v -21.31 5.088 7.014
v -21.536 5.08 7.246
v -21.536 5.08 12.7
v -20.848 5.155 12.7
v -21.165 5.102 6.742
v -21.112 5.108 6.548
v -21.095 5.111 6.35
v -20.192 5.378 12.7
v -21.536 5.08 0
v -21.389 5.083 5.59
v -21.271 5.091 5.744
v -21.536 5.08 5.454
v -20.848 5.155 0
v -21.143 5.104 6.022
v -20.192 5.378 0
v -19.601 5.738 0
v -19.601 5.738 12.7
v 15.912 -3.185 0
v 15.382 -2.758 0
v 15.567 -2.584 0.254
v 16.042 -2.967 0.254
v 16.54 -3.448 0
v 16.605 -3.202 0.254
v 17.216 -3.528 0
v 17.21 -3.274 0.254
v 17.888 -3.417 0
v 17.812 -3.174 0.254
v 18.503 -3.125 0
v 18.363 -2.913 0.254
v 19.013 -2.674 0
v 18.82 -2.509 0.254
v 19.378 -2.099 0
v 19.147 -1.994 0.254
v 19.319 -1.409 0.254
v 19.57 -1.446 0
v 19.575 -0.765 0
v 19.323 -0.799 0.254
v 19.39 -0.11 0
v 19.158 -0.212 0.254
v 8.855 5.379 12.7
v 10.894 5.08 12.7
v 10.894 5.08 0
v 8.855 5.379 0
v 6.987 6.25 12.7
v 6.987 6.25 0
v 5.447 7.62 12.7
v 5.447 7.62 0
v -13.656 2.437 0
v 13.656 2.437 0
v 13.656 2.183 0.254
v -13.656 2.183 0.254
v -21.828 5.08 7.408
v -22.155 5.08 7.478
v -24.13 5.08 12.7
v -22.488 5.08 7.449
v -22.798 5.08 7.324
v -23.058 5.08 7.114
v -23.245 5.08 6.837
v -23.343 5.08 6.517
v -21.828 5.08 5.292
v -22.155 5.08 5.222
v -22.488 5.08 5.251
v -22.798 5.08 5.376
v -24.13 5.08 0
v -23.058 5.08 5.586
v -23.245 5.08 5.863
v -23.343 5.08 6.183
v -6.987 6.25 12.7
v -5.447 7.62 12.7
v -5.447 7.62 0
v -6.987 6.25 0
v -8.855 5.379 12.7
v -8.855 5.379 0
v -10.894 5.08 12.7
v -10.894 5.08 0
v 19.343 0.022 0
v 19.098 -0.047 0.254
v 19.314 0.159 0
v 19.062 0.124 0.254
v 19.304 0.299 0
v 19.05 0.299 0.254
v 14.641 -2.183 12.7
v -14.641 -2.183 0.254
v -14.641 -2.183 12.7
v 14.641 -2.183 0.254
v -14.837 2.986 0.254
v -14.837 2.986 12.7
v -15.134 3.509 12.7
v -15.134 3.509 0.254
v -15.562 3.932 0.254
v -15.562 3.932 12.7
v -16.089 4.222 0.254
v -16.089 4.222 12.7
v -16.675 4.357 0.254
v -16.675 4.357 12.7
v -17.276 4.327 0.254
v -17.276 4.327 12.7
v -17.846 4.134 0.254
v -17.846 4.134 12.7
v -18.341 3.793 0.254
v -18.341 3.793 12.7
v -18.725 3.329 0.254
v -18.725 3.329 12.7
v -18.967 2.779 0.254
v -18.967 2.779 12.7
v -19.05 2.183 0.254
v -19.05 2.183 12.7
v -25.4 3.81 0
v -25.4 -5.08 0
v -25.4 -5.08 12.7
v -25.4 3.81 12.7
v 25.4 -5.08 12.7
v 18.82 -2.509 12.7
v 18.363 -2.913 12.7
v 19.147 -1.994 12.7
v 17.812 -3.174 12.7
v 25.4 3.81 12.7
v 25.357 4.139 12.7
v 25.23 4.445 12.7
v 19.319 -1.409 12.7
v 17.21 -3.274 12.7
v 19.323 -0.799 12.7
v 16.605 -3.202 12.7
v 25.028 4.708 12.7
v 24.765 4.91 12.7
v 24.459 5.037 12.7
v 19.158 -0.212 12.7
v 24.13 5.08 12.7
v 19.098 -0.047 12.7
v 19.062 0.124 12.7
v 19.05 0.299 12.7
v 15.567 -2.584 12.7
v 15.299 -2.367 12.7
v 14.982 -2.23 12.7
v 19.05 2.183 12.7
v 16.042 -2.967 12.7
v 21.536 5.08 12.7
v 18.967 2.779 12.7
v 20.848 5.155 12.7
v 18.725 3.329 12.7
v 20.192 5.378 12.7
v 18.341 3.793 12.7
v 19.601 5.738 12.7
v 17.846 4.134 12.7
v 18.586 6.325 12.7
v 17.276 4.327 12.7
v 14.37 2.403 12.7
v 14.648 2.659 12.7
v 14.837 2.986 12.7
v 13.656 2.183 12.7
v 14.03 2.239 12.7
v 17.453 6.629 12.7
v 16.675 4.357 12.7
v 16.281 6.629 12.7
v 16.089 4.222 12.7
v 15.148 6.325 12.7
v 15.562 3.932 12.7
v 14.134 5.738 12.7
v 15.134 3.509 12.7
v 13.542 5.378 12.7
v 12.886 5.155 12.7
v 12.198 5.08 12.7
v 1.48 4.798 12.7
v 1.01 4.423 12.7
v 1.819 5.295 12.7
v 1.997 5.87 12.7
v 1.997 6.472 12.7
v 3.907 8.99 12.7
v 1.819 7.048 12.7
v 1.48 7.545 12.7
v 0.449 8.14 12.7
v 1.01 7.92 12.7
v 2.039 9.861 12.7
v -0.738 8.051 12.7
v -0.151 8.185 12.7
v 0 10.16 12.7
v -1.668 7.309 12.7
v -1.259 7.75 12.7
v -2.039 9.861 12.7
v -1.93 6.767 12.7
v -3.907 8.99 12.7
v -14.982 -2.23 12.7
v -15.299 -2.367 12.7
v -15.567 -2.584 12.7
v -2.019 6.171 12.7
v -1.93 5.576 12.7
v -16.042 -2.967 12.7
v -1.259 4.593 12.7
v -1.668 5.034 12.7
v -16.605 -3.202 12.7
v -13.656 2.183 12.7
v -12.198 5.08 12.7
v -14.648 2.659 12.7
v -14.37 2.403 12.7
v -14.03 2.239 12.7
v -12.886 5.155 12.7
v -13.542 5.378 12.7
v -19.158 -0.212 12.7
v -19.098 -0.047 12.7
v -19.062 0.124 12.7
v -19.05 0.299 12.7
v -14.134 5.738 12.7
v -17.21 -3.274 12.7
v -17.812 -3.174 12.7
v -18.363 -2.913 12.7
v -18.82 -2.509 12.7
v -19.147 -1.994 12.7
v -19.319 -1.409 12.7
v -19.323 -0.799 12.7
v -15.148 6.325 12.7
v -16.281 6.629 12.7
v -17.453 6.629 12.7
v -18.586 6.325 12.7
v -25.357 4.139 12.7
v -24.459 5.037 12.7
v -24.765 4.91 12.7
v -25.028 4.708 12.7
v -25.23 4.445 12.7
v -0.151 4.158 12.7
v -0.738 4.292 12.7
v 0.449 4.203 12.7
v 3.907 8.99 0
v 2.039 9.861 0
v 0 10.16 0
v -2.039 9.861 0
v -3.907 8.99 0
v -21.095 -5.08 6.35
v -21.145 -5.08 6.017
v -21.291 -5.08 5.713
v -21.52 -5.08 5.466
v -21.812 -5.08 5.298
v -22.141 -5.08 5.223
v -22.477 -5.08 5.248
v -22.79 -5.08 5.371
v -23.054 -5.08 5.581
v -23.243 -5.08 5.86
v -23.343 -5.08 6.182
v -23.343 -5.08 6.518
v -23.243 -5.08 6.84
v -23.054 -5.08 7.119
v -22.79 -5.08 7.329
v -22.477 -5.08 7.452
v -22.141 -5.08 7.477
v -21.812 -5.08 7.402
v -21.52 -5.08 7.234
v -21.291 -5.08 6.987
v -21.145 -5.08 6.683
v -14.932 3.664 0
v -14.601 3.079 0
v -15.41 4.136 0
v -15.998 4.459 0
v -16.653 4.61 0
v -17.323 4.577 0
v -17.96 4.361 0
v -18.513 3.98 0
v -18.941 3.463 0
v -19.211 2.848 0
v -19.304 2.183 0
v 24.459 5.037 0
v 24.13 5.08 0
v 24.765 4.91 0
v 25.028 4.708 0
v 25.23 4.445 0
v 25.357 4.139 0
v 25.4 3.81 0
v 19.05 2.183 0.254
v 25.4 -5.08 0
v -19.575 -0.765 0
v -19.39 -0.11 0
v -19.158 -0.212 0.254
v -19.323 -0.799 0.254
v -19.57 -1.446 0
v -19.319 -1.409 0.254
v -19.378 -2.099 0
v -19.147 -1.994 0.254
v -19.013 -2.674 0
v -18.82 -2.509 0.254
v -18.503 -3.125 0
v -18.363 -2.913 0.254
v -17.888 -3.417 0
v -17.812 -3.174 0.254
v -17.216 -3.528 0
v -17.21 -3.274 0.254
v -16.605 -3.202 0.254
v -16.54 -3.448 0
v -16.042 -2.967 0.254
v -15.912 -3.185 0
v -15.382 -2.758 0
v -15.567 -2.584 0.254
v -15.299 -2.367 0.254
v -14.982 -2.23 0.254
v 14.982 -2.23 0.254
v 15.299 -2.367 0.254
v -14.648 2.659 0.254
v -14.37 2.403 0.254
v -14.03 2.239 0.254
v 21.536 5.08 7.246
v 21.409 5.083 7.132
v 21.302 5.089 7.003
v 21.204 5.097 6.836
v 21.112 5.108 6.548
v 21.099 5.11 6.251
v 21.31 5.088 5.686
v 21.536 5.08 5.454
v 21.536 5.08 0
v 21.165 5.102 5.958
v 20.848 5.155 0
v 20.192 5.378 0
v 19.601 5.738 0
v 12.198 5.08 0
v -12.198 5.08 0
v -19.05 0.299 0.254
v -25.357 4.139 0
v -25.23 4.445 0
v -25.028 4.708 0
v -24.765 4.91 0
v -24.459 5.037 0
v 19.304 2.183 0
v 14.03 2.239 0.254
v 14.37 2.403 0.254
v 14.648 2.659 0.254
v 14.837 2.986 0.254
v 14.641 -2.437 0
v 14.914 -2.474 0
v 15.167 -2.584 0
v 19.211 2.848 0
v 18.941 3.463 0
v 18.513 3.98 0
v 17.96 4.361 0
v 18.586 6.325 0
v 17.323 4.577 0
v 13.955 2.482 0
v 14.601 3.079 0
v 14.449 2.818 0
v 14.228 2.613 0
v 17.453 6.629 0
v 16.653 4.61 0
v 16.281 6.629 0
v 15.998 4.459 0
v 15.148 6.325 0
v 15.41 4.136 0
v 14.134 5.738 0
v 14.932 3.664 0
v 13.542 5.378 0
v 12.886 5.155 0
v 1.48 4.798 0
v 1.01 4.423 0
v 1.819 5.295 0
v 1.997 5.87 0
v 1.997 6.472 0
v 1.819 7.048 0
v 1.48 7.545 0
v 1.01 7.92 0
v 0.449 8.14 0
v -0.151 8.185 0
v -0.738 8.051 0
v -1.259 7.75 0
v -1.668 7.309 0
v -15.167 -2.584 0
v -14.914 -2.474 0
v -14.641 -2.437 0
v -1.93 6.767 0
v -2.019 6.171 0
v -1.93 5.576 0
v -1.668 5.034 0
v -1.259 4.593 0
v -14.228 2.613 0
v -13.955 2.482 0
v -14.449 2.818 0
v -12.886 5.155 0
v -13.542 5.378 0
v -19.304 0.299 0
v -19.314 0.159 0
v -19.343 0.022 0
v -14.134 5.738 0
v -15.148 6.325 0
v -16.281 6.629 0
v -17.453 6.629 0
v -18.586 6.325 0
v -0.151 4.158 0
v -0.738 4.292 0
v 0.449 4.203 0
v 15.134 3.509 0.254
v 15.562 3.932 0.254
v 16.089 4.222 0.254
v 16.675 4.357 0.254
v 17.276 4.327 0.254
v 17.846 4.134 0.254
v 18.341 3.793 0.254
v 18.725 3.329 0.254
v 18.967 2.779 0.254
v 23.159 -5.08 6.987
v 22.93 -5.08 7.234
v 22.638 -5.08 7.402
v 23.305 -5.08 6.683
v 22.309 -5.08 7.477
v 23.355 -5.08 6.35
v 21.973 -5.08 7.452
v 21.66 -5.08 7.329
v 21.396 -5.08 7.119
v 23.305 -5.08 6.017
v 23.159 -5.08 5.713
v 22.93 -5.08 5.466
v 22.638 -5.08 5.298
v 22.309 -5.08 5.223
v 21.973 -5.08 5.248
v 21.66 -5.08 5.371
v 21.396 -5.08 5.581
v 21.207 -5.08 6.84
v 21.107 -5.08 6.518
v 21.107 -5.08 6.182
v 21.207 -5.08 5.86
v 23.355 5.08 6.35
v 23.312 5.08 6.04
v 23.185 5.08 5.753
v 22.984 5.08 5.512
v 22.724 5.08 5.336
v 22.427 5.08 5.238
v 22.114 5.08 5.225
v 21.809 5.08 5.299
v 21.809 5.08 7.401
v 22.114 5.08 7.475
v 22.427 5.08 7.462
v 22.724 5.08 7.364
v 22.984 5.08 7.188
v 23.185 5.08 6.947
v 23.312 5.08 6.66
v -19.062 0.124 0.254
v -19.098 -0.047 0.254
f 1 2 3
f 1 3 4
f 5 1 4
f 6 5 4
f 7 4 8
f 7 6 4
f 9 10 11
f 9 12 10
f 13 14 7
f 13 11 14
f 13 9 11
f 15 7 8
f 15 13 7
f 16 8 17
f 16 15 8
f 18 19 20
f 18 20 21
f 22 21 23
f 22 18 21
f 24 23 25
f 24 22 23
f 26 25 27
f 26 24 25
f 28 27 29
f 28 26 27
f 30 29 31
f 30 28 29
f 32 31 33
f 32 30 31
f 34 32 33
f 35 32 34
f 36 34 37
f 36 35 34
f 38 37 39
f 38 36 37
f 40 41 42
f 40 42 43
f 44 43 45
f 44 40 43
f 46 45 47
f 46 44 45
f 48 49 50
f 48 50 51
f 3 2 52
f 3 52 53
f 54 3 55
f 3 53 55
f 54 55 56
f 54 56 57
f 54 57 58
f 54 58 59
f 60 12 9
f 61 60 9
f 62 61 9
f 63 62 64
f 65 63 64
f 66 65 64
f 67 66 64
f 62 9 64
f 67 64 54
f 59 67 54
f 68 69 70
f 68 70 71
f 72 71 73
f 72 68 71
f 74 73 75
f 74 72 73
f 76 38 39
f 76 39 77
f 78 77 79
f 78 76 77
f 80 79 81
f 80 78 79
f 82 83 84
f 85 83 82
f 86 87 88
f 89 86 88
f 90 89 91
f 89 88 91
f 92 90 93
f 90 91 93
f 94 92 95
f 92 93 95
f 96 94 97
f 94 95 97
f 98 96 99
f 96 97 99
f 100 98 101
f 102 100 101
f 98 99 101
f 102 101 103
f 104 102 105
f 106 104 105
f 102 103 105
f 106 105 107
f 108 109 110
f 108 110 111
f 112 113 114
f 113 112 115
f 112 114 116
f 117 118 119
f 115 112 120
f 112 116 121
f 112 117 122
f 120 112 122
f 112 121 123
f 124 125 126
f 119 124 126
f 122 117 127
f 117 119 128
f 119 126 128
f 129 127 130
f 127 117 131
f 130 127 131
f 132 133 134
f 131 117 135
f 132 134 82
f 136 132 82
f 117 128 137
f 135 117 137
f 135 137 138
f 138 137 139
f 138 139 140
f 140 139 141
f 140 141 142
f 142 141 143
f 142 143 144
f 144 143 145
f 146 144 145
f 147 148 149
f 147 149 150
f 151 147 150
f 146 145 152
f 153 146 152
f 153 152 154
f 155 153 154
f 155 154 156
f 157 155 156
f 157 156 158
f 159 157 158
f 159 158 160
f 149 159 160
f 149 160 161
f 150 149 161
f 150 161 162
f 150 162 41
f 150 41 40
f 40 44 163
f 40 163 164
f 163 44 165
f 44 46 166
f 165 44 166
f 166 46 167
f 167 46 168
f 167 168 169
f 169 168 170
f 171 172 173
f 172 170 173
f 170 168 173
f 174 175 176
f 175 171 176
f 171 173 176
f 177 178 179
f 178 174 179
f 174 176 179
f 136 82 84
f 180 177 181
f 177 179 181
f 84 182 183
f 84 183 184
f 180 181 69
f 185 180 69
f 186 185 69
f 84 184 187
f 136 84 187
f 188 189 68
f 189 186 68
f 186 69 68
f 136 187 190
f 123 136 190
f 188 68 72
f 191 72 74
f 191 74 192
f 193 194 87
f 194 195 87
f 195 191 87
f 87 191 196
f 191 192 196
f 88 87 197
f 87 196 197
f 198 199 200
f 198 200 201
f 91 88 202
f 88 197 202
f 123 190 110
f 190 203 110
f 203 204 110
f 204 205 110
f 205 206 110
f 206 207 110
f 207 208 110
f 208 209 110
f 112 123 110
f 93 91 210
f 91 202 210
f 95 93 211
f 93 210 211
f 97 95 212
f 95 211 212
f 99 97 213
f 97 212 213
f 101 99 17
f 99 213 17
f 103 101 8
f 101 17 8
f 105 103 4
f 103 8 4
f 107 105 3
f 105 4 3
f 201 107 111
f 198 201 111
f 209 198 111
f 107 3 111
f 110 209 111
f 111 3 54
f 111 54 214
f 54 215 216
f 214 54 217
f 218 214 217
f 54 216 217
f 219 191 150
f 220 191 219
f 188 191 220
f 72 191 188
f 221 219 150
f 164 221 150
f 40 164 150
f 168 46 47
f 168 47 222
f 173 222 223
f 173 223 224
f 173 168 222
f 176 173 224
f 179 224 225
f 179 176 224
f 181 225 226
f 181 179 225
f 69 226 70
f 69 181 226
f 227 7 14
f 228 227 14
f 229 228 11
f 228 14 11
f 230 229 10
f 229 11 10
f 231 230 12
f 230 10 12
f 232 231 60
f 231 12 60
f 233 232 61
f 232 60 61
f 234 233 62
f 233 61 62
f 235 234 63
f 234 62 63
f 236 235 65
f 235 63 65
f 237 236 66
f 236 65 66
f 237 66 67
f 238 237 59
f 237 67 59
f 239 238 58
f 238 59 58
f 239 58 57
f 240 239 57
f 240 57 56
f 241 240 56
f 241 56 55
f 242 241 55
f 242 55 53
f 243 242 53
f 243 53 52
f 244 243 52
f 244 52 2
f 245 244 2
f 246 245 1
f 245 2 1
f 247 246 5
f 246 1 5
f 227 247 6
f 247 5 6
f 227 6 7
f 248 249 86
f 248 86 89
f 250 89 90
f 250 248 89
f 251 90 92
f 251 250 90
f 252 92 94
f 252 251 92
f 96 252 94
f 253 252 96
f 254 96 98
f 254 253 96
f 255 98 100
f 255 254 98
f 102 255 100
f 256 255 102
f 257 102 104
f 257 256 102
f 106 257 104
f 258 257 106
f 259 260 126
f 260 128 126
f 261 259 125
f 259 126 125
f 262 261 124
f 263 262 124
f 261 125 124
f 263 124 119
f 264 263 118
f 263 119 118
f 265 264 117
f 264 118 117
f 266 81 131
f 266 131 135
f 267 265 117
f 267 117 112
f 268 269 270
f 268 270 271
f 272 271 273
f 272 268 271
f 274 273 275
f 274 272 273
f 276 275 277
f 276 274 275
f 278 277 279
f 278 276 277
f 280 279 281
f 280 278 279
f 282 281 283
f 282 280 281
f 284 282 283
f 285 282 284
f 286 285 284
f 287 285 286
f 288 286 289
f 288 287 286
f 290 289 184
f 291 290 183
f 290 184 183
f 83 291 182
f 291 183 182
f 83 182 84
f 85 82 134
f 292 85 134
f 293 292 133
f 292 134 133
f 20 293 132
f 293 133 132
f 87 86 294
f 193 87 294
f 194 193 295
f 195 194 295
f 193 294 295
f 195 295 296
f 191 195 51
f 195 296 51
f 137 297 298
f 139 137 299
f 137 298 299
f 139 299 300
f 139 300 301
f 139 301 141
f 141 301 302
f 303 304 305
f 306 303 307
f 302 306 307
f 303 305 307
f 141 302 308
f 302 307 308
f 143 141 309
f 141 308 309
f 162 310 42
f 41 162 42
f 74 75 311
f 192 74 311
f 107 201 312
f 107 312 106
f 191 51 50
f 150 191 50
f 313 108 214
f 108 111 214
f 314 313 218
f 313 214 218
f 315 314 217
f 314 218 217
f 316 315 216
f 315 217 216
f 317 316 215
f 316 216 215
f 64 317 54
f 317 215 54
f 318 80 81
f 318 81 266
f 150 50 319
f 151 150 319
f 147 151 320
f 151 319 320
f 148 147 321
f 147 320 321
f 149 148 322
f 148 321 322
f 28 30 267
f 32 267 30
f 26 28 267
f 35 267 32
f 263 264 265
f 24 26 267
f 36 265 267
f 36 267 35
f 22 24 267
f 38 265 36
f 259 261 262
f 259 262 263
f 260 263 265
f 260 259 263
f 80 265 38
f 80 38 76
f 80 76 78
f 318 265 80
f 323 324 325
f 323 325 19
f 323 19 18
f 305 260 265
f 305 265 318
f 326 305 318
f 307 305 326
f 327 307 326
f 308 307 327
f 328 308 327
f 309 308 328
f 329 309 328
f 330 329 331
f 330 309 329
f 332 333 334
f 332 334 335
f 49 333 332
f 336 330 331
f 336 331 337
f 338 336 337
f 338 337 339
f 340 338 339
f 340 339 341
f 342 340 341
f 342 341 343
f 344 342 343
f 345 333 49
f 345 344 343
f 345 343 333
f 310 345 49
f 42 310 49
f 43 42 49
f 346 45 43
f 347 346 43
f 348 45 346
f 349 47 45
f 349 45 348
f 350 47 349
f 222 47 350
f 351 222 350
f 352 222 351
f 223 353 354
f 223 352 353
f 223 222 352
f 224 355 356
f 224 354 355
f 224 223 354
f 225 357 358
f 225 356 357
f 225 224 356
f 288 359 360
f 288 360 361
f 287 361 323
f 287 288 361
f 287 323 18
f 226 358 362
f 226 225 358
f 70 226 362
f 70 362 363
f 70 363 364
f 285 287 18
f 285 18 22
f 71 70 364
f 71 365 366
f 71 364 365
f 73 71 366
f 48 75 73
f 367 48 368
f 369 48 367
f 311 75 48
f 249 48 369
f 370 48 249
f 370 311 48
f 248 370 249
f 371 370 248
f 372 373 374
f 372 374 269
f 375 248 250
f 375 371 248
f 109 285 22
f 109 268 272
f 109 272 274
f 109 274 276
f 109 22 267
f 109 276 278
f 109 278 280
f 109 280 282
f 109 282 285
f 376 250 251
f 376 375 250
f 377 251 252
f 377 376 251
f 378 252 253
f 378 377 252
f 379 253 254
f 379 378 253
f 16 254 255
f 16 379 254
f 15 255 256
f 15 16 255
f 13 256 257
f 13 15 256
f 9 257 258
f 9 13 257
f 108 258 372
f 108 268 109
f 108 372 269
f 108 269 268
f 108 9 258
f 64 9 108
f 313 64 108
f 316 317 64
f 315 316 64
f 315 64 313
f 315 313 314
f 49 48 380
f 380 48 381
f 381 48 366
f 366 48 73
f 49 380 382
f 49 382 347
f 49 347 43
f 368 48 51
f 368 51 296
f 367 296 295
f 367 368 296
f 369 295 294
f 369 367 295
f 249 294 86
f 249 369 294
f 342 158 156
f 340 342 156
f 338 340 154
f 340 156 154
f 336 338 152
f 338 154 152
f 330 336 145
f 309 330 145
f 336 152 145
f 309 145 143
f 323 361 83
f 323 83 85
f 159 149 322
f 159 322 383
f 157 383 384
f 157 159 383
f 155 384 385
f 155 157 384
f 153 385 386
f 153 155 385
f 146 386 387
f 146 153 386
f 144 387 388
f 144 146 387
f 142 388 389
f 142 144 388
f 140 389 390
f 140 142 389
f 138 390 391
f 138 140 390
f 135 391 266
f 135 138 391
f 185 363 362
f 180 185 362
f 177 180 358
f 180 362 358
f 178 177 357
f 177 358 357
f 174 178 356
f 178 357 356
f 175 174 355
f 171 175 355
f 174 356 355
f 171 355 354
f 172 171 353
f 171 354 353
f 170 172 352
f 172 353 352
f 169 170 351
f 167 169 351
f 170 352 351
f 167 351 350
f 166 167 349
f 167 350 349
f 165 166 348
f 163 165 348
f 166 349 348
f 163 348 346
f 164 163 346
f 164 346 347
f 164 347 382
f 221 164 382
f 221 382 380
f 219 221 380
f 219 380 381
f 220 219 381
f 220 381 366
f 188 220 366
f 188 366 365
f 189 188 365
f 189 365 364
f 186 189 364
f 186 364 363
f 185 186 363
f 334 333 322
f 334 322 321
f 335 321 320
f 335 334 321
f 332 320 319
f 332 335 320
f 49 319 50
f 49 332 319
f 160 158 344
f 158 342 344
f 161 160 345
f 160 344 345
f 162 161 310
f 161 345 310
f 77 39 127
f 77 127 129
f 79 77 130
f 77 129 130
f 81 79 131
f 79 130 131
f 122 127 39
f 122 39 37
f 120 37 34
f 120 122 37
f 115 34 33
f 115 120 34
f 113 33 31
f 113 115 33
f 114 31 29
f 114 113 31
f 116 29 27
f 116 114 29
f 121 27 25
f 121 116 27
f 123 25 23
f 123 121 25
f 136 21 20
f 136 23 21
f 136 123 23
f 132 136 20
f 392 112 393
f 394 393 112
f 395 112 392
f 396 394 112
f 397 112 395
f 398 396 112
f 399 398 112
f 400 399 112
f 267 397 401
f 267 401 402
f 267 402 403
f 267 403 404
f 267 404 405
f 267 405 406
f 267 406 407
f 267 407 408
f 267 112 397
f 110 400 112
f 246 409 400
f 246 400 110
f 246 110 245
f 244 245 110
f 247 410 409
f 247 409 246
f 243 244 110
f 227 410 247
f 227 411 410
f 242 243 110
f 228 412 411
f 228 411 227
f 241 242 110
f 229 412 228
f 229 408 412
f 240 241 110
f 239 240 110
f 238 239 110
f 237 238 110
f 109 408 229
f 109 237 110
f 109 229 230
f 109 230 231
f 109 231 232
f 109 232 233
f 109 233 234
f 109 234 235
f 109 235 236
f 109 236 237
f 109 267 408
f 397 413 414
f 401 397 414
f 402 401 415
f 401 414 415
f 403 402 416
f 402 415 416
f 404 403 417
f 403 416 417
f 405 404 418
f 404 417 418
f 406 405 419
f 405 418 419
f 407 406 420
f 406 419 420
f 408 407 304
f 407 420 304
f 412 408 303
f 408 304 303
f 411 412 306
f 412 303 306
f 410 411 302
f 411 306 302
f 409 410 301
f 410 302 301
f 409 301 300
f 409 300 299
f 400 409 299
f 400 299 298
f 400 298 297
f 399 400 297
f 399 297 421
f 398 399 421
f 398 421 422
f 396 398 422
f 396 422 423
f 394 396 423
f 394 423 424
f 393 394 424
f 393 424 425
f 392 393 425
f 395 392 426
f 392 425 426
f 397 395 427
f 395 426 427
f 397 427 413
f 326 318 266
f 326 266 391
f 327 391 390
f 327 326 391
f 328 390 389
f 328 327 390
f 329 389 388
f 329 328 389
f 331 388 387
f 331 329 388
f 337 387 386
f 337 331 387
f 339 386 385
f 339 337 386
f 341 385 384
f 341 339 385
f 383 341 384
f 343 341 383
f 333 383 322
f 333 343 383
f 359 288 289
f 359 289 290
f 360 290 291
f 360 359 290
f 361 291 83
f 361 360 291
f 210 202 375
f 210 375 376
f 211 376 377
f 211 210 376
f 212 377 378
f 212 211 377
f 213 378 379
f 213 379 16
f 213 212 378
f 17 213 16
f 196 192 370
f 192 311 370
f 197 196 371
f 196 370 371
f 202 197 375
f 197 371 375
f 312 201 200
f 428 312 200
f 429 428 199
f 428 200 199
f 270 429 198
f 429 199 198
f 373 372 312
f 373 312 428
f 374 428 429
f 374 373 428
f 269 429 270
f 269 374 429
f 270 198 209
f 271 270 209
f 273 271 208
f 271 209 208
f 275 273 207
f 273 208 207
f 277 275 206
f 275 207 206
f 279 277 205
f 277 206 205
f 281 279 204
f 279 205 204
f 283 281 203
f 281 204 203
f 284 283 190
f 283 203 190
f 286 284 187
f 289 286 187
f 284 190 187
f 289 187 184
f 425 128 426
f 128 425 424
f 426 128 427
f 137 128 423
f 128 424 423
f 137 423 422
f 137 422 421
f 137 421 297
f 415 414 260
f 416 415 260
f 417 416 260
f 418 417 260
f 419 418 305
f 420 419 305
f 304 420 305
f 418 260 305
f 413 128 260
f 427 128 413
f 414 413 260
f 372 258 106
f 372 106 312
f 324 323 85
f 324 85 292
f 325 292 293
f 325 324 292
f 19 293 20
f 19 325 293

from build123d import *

# Parameters (mm, degrees)
SKETCH1_W                  = 38.1
SKETCH1_H                  = 4.365625
BOSS_EXTRUDE1_DEPTH        = 12.7
BOSS_EXTRUDE3_DEPTH        = 12.7
SKETCH8_R                  = 2.1828125
CUT_EXTRUDE1_DEPTH         = 30.170285502
SKETCH11_R                 = 2.1828125
CUT_EXTRUDE2_DEPTH         = 30.170285502
FILLET1_R                  = 3.175
FILLET2_R                  = 3.175
F_4_40_TAPPED_HOLE1_D      = 2.2606
BOSS_EXTRUDE4_DEPTH        = 12.7
TAP_DRILL_FOR_10_32_TAP1_D = 4.0386
FILLET3_R                  = 1.27
FILLET4_R                  = 1.27
CHAMFER1_SIZE              = 0.254


with BuildPart() as part:
    # Sketch1 → Boss-Extrude1 (new body)
    with BuildSketch(Plane.XY):
        Polygon((6.35, 5.08), (25.4, 5.08), (25.4, -5.08), (-25.4, -5.08), (-25.4, 5.08), (-6.35, 5.08), align=None)
        Rectangle(SKETCH1_W, SKETCH1_H, mode=Mode.SUBTRACT)
    extrude(amount=BOSS_EXTRUDE1_DEPTH)

    # Sketch7 → Boss-Extrude3 (add)
    with BuildSketch(Plane.XY.offset(12.7)):
        with BuildLine():
            Line((-20.290450061, 5.08), (-13.443924939, 5.08))
            ThreePointArc((-13.443924939, 5.08), (-16.8671875, 6.6675), (-20.290450061, 5.08))
        make_face()
    boss_extrude3 = extrude(amount=-BOSS_EXTRUDE3_DEPTH)

    # Sketch8 → Cut-Extrude1 (cut, through all)
    with BuildSketch(Plane.XY.offset(12.7)):
        with Locations((-16.8671875, 2.1828125)):
            Circle(SKETCH8_R)
    cut_extrude1 = extrude(amount=-CUT_EXTRUDE1_DEPTH, mode=Mode.SUBTRACT)

    # Sketch11 → Cut-Extrude2 (cut, through all)
    with BuildSketch(Plane.XY.offset(12.7)):
        with Locations((-17.159628923, -1.09140625)):
            Circle(SKETCH11_R)
    cut_extrude2 = extrude(amount=-CUT_EXTRUDE2_DEPTH, mode=Mode.SUBTRACT)

    # Fillet1
    fillet1_edges = [part.edges().sort_by_distance(p)[0] for p in [
        (-13.443924939, 5.08, 6.35),
        (-20.290450061, 5.08, 6.35),
    ]]
    fillet(fillet1_edges, radius=FILLET1_R)

    # Mirror1: Cut-Extrude1, Cut-Extrude2 across plane
    add(cut_extrude1.mirror(Plane(origin=(0, 0, 0), x_dir=(0, 0, 1), z_dir=(1, 0, 0))), mode=Mode.SUBTRACT)
    add(cut_extrude2.mirror(Plane(origin=(0, 0, 0), x_dir=(0, 0, 1), z_dir=(1, 0, 0))), mode=Mode.SUBTRACT)

    # Mirror2: Boss-Extrude3 across plane
    add(boss_extrude3.mirror(Plane(origin=(0, 0, 0), x_dir=(0, 0, 1), z_dir=(1, 0, 0))))

    # Fillet2
    fillet2_edges = [part.edges().sort_by_distance(p)[0] for p in [
        (13.443924939, 5.08, 6.35),
        (20.290450061, 5.08, 6.35),
    ]]
    fillet(fillet2_edges, radius=FILLET2_R)

    # #4-40 Tapped Hole1 (through all)
    with Locations(Plane(origin=(0, -5.08, 0), x_dir=(-1, 0, 0), z_dir=(0, -1, 0))):
        with Locations((22.225, -6.35), (-22.225, -6.35)):
            Hole(F_4_40_TAPPED_HOLE1_D / 2)

    # Sketch10 → Boss-Extrude4 (add)
    with BuildSketch(Plane.XY.offset(12.7)):
        with BuildLine():
            Line((-10.894095156, 5.08), (10.894095156, 5.08))
            ThreePointArc((10.894095156, 5.08), (7.889019146, 5.746209312), (5.447047578, 7.62))
            ThreePointArc((5.447047578, 7.62), (0, 10.16), (-5.447047578, 7.62))
            ThreePointArc((-5.447047578, 7.62), (-7.889019146, 5.746209312), (-10.894095156, 5.08))
        make_face()
    extrude(amount=-BOSS_EXTRUDE4_DEPTH)

    # Tap Drill for #10-32 Tap1 (through all)
    with Locations(Plane.XY.offset(12.7)):
        with Locations((0, 6.17140625)):
            Hole(TAP_DRILL_FOR_10_32_TAP1_D / 2)

    # Fillet3
    fillet3_edges = [part.edges().sort_by_distance(p)[0] for p in [
        (-14.684375, 2.1828125, 6.35),
        (-15.269257847, -2.1828125, 6.35),
        (-19.05, 0, 6.35),
        (14.684375, 2.1828125, 6.35),
        (19.05, 0, 6.35),
        (15.269257847, -2.1828125, 6.35),
    ]]
    fillet(fillet3_edges, radius=FILLET3_R)

    # Fillet4
    fillet4_edges = [part.edges().sort_by_distance(p)[0] for p in [
        (-25.4, 5.08, 6.35),
        (25.4, 5.08, 6.35),
    ]]
    fillet(fillet4_edges, radius=FILLET4_R)

    # Chamfer1
    chamfer1_edges = [part.edges().sort_by_distance(p)[0] for p in [
        (-18.362829894, -2.912663462, 0),
        (0, -2.1828125, 0),
        (18.362829894, -2.912663462, 0),
        (19.05, 1.241039162, 0),
        (17.275850124, 4.327029203, 0),
        (0, 2.1828125, 0),
        (-17.275850124, 4.327029203, 0),
        (-14.370442252, 2.402538589, 0),
        (14.370442252, 2.402538589, 0),
        (-15.14545512, -2.287485231, 0),
        (15.14545512, -2.287485231, 0),
        (19.077182057, 0.037916326, 0),
        (-19.077182057, 0.037916326, 0),
        (-19.05, 1.241039162, 0),
    ]]
    chamfer(chamfer1_edges, length=CHAMFER1_SIZE)


solid = part.part
